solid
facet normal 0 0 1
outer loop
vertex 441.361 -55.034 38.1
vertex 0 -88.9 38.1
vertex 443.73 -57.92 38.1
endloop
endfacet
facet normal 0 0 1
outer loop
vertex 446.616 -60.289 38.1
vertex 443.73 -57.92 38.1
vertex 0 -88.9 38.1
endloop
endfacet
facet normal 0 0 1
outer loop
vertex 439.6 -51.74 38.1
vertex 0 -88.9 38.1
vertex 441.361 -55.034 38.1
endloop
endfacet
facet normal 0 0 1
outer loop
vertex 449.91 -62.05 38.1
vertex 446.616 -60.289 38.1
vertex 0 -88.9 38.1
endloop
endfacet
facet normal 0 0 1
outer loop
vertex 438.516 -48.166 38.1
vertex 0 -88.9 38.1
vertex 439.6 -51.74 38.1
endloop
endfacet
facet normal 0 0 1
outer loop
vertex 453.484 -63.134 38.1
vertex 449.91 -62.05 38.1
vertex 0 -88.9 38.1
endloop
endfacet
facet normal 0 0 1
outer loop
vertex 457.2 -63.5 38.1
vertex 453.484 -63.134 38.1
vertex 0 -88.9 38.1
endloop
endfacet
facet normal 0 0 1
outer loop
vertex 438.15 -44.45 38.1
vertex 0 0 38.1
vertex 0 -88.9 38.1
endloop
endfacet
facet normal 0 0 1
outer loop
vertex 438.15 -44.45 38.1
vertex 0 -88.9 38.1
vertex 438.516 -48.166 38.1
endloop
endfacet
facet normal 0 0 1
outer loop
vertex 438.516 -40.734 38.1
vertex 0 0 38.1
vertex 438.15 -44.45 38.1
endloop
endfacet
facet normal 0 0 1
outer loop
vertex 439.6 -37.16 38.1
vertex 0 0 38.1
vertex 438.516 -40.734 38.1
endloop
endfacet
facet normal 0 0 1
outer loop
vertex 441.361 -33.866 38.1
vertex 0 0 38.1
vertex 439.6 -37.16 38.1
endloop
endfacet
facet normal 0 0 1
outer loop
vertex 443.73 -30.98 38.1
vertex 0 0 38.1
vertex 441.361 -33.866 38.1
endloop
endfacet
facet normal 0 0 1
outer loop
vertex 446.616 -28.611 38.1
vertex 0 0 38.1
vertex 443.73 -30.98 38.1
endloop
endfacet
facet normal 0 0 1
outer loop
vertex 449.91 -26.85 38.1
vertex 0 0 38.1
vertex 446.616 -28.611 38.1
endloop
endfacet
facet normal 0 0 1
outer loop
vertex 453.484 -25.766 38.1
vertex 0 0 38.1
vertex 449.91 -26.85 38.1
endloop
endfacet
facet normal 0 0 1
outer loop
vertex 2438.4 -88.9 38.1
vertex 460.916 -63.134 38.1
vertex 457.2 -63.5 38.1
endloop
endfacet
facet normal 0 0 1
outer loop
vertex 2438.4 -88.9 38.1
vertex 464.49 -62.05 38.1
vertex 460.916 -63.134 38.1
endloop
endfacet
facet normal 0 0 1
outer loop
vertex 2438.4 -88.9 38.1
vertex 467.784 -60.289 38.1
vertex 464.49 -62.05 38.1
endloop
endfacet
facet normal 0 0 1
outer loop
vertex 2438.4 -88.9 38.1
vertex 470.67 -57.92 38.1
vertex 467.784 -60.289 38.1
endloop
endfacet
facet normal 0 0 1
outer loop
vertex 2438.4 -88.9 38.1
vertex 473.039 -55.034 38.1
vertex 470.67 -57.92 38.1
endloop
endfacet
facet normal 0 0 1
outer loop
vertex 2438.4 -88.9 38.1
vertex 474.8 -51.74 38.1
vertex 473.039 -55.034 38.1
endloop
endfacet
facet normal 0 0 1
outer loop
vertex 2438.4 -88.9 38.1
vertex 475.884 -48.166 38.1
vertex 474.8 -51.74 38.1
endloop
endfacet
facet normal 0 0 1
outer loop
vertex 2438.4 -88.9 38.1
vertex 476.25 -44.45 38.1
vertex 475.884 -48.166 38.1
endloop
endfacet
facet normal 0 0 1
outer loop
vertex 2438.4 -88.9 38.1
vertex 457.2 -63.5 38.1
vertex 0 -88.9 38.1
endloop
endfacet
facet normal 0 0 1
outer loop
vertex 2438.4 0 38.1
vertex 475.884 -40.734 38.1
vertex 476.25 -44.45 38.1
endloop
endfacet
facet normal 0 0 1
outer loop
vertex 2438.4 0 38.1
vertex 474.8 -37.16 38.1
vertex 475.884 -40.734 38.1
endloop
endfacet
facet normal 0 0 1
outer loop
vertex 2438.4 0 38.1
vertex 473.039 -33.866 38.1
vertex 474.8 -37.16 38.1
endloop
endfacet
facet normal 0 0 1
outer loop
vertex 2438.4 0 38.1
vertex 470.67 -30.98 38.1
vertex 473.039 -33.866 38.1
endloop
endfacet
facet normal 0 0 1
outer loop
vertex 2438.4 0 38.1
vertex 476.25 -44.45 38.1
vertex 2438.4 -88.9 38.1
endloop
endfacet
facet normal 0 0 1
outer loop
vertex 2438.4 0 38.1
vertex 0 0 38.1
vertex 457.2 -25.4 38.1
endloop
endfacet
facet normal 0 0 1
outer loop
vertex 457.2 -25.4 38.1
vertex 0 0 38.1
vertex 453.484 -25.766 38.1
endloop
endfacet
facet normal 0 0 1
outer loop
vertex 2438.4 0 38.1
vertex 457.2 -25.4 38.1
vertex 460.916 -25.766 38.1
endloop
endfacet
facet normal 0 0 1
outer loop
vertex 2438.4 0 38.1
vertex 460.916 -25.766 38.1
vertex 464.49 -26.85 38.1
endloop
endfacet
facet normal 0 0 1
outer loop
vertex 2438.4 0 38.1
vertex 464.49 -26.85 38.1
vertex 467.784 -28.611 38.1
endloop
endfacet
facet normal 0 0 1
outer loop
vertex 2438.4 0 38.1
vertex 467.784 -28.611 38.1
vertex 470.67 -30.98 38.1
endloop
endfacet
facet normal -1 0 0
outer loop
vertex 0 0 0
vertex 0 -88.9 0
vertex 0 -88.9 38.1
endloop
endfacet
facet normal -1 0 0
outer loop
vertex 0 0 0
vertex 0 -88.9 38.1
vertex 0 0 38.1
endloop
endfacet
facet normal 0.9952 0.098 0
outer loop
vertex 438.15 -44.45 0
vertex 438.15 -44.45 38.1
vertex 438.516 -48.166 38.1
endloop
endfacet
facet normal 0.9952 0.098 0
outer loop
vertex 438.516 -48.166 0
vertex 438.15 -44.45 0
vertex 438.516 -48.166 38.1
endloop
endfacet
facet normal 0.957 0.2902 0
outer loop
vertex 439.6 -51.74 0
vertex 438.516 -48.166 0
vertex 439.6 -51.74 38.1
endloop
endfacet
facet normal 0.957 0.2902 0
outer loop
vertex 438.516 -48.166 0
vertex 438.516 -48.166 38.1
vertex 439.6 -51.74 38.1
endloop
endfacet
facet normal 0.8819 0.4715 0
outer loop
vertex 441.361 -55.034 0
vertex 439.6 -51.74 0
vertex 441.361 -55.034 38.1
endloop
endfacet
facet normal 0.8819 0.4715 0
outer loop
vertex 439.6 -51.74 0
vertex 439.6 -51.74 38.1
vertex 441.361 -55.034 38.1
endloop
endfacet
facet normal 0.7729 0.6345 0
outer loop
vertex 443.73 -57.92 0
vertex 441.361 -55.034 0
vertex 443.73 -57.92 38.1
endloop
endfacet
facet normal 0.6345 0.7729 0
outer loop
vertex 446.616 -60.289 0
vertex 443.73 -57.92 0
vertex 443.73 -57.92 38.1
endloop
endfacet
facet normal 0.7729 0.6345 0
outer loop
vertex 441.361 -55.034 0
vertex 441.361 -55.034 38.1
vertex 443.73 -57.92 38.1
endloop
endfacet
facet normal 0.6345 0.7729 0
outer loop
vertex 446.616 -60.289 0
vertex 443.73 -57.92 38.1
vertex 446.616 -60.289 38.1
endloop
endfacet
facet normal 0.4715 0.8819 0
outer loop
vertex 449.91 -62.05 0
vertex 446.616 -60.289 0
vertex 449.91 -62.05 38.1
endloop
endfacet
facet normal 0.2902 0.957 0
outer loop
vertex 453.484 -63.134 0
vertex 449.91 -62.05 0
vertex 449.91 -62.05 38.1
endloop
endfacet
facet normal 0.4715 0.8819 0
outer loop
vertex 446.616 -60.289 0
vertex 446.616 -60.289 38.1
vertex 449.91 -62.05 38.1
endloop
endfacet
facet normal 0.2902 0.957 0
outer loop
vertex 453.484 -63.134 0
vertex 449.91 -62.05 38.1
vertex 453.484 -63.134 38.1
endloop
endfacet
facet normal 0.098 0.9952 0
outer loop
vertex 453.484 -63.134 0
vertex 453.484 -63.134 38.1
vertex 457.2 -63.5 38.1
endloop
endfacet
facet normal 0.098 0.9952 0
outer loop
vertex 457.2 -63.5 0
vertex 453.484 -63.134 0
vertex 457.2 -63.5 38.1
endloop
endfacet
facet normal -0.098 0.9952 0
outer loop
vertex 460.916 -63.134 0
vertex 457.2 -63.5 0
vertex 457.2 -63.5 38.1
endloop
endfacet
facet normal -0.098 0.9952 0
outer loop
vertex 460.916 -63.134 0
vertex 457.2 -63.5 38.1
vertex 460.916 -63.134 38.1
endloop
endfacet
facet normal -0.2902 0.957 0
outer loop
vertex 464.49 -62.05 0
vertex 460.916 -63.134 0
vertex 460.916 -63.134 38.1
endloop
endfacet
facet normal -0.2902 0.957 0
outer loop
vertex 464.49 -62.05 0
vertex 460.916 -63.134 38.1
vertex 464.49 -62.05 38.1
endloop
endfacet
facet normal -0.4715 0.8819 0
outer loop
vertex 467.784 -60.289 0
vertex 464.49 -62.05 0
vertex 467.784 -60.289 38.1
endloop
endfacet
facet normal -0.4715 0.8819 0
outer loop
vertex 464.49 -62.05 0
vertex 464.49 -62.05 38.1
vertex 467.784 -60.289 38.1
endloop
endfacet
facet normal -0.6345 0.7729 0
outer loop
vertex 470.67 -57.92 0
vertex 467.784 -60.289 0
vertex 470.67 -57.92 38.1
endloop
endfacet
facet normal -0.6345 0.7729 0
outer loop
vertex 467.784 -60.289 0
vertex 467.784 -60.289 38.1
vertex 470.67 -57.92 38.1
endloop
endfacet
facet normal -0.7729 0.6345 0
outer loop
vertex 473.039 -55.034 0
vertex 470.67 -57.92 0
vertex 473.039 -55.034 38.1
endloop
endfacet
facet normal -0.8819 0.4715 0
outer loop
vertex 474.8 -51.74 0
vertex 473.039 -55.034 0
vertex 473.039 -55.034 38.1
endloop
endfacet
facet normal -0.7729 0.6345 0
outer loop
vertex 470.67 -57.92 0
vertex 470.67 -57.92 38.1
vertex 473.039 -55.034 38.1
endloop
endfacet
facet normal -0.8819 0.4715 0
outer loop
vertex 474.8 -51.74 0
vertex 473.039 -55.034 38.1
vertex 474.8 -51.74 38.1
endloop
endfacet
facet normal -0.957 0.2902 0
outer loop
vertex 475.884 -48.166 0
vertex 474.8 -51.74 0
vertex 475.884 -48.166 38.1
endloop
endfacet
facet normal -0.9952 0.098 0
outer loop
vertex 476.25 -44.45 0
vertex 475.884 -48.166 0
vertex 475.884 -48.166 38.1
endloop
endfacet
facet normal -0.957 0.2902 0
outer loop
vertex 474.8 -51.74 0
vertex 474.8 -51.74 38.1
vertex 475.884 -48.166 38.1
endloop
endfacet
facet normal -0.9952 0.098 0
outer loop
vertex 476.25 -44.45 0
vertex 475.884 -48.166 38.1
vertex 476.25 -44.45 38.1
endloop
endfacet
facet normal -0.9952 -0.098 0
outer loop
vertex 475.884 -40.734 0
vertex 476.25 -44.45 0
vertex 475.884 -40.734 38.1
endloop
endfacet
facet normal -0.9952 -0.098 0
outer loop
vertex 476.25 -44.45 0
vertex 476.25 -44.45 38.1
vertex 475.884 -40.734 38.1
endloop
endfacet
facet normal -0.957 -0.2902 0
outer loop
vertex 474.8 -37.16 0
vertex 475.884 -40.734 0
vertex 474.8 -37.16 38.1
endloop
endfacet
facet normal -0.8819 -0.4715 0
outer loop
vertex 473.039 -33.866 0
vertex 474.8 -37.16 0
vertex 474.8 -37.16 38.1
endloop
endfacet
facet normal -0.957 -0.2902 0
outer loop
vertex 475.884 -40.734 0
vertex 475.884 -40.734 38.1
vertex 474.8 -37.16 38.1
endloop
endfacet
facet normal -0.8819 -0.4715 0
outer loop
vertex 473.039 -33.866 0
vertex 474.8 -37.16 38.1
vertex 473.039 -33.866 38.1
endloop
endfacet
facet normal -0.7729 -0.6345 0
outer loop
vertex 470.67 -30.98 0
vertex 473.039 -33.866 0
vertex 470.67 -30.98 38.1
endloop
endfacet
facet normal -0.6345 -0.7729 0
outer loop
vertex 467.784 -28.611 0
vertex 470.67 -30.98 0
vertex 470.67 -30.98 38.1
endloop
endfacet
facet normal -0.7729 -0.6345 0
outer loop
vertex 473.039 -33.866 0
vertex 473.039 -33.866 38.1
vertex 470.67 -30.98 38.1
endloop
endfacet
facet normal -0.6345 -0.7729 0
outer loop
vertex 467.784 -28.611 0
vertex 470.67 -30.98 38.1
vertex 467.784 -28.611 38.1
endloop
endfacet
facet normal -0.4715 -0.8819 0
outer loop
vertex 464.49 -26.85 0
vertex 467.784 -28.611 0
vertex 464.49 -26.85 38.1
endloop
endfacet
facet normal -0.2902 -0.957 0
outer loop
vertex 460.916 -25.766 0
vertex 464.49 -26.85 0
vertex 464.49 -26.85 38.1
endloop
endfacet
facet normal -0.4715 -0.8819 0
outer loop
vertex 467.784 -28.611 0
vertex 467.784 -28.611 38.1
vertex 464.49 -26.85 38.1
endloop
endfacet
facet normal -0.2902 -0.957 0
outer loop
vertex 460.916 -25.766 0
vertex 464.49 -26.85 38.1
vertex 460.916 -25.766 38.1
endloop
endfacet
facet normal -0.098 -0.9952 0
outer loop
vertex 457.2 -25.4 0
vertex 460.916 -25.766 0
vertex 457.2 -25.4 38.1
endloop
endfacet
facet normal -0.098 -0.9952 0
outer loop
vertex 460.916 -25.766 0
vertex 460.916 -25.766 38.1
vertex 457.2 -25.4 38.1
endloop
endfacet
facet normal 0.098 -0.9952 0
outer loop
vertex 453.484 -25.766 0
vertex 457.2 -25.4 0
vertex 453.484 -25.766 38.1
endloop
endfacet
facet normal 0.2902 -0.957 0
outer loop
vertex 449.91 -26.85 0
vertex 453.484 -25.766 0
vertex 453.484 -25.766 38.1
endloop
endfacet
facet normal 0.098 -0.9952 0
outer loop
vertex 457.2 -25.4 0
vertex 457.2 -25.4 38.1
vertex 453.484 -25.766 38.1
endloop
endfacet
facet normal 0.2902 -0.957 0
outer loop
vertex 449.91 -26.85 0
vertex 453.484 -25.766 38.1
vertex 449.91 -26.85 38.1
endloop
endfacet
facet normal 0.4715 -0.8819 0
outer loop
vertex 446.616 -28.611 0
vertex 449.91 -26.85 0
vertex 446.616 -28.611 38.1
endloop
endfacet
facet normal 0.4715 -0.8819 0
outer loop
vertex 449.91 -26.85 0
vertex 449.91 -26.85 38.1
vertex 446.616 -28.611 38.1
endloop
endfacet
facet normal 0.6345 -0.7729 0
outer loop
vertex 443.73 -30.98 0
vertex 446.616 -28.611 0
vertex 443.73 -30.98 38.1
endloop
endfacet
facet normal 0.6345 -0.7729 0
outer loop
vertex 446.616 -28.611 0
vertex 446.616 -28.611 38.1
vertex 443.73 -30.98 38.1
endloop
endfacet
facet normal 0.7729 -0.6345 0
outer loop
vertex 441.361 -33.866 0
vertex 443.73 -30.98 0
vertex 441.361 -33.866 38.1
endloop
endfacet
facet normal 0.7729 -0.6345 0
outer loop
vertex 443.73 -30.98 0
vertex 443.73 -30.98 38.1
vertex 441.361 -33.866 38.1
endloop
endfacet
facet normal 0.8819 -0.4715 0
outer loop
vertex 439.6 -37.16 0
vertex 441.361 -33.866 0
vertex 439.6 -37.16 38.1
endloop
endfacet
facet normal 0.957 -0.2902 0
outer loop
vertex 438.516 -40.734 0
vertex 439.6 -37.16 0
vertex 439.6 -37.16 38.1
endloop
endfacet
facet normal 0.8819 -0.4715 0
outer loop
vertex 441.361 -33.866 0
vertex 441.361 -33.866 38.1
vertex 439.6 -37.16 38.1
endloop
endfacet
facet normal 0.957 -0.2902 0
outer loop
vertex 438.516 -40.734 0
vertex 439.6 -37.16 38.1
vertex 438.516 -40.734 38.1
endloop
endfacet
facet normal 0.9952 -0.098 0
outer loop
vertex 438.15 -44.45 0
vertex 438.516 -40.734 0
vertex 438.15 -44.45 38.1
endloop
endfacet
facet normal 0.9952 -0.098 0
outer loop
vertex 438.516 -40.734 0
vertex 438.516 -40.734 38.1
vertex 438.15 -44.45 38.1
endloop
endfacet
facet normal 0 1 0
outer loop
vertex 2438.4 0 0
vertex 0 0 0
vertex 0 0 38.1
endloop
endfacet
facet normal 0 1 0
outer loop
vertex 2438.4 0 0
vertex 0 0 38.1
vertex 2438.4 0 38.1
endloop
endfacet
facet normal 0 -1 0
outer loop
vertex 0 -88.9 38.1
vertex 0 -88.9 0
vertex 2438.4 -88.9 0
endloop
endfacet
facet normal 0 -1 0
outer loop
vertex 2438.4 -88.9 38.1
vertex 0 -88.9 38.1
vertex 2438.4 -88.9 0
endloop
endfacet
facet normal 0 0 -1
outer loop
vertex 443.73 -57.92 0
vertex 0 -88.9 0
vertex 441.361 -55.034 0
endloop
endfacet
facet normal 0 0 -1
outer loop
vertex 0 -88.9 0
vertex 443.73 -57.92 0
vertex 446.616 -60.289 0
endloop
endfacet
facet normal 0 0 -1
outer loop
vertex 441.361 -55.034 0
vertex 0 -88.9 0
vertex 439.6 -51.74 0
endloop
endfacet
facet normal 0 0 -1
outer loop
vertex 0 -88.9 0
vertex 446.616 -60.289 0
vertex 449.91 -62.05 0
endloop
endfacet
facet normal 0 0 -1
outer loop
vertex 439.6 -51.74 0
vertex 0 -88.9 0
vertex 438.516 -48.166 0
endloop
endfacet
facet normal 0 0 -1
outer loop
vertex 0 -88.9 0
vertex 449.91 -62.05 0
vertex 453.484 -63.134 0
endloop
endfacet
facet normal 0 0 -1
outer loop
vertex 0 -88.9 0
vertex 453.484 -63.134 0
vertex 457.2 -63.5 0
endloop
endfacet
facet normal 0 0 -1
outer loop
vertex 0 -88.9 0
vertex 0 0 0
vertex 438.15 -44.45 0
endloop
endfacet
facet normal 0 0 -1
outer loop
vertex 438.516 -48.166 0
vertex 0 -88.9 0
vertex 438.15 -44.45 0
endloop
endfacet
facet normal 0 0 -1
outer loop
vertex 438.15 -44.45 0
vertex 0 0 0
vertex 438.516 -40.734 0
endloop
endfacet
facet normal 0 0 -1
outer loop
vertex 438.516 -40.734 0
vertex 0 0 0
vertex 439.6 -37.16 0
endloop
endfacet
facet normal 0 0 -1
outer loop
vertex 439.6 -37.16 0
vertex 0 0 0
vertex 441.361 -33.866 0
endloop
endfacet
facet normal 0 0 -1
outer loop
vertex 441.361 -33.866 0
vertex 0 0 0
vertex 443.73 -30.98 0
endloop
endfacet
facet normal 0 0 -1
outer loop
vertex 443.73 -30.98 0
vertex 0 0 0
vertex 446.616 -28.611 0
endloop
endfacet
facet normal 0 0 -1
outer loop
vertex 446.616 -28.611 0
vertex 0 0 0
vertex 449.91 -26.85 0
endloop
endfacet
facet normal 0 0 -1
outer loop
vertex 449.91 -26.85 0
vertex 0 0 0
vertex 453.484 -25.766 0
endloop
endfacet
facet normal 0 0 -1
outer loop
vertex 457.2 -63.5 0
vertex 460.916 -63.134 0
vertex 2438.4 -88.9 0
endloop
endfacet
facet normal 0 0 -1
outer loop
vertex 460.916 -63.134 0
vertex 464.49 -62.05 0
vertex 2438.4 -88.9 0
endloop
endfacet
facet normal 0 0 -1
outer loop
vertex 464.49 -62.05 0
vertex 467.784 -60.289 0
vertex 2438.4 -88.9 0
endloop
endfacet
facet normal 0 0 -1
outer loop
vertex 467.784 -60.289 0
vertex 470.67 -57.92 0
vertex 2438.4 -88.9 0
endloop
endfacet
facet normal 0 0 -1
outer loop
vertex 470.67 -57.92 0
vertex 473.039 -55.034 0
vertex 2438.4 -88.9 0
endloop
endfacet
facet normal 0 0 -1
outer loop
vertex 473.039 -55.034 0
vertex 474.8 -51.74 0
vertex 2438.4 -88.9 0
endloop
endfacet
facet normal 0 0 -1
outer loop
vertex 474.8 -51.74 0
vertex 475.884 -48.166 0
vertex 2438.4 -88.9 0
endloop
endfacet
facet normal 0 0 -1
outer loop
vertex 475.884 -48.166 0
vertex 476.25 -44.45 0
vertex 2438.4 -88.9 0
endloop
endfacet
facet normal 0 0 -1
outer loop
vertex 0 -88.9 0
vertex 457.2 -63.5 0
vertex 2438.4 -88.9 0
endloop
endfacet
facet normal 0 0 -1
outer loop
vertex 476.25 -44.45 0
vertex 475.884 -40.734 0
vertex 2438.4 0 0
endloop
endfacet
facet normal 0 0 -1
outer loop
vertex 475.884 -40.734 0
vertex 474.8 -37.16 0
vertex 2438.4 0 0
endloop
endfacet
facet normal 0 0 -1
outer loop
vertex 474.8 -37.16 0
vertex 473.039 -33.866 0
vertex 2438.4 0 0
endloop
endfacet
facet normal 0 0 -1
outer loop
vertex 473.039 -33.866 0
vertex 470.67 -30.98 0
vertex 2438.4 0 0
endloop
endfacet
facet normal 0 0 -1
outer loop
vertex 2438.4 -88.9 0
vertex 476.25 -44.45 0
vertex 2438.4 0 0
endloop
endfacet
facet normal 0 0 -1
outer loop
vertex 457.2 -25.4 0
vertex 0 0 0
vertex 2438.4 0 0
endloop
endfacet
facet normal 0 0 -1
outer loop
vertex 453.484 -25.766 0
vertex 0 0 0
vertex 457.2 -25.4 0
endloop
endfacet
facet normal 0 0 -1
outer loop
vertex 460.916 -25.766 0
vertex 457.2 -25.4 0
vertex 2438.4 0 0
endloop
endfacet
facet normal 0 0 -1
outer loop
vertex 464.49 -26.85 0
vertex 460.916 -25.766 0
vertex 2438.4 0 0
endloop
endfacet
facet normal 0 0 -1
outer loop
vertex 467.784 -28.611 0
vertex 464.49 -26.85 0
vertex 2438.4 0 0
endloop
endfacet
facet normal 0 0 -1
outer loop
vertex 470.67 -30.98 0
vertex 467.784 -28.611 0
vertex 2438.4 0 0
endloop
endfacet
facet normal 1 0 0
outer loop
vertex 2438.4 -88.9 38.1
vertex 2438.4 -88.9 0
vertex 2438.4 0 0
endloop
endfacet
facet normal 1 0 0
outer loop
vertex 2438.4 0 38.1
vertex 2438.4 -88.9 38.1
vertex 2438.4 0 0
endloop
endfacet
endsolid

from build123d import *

# Parameters (mm, degrees)
F0_W     = 2438.4
F0_H     = 88.9
F1_DEPTH = 38.1
F3_DEPTH = 38.1


with BuildPart() as f1:
    # F0 (on Top) → F1 (new body)
    with BuildSketch(Plane.XY):
        with Locations((1219.2, -44.45)):
            Rectangle(F0_W, F0_H)
    extrude(amount=F1_DEPTH)

    # F2 (on face) → F3 (cut)
    with BuildSketch(Plane.XY.offset(38.1)):
        with BuildLine():
            ThreePointArc((476.25, -44.45), (457.2, -25.4), (438.15, -44.45))
            ThreePointArc((438.15, -44.45), (457.2, -63.5), (476.25, -44.45))
        make_face()
    extrude(amount=-F3_DEPTH, mode=Mode.SUBTRACT)


solid = f1.part
